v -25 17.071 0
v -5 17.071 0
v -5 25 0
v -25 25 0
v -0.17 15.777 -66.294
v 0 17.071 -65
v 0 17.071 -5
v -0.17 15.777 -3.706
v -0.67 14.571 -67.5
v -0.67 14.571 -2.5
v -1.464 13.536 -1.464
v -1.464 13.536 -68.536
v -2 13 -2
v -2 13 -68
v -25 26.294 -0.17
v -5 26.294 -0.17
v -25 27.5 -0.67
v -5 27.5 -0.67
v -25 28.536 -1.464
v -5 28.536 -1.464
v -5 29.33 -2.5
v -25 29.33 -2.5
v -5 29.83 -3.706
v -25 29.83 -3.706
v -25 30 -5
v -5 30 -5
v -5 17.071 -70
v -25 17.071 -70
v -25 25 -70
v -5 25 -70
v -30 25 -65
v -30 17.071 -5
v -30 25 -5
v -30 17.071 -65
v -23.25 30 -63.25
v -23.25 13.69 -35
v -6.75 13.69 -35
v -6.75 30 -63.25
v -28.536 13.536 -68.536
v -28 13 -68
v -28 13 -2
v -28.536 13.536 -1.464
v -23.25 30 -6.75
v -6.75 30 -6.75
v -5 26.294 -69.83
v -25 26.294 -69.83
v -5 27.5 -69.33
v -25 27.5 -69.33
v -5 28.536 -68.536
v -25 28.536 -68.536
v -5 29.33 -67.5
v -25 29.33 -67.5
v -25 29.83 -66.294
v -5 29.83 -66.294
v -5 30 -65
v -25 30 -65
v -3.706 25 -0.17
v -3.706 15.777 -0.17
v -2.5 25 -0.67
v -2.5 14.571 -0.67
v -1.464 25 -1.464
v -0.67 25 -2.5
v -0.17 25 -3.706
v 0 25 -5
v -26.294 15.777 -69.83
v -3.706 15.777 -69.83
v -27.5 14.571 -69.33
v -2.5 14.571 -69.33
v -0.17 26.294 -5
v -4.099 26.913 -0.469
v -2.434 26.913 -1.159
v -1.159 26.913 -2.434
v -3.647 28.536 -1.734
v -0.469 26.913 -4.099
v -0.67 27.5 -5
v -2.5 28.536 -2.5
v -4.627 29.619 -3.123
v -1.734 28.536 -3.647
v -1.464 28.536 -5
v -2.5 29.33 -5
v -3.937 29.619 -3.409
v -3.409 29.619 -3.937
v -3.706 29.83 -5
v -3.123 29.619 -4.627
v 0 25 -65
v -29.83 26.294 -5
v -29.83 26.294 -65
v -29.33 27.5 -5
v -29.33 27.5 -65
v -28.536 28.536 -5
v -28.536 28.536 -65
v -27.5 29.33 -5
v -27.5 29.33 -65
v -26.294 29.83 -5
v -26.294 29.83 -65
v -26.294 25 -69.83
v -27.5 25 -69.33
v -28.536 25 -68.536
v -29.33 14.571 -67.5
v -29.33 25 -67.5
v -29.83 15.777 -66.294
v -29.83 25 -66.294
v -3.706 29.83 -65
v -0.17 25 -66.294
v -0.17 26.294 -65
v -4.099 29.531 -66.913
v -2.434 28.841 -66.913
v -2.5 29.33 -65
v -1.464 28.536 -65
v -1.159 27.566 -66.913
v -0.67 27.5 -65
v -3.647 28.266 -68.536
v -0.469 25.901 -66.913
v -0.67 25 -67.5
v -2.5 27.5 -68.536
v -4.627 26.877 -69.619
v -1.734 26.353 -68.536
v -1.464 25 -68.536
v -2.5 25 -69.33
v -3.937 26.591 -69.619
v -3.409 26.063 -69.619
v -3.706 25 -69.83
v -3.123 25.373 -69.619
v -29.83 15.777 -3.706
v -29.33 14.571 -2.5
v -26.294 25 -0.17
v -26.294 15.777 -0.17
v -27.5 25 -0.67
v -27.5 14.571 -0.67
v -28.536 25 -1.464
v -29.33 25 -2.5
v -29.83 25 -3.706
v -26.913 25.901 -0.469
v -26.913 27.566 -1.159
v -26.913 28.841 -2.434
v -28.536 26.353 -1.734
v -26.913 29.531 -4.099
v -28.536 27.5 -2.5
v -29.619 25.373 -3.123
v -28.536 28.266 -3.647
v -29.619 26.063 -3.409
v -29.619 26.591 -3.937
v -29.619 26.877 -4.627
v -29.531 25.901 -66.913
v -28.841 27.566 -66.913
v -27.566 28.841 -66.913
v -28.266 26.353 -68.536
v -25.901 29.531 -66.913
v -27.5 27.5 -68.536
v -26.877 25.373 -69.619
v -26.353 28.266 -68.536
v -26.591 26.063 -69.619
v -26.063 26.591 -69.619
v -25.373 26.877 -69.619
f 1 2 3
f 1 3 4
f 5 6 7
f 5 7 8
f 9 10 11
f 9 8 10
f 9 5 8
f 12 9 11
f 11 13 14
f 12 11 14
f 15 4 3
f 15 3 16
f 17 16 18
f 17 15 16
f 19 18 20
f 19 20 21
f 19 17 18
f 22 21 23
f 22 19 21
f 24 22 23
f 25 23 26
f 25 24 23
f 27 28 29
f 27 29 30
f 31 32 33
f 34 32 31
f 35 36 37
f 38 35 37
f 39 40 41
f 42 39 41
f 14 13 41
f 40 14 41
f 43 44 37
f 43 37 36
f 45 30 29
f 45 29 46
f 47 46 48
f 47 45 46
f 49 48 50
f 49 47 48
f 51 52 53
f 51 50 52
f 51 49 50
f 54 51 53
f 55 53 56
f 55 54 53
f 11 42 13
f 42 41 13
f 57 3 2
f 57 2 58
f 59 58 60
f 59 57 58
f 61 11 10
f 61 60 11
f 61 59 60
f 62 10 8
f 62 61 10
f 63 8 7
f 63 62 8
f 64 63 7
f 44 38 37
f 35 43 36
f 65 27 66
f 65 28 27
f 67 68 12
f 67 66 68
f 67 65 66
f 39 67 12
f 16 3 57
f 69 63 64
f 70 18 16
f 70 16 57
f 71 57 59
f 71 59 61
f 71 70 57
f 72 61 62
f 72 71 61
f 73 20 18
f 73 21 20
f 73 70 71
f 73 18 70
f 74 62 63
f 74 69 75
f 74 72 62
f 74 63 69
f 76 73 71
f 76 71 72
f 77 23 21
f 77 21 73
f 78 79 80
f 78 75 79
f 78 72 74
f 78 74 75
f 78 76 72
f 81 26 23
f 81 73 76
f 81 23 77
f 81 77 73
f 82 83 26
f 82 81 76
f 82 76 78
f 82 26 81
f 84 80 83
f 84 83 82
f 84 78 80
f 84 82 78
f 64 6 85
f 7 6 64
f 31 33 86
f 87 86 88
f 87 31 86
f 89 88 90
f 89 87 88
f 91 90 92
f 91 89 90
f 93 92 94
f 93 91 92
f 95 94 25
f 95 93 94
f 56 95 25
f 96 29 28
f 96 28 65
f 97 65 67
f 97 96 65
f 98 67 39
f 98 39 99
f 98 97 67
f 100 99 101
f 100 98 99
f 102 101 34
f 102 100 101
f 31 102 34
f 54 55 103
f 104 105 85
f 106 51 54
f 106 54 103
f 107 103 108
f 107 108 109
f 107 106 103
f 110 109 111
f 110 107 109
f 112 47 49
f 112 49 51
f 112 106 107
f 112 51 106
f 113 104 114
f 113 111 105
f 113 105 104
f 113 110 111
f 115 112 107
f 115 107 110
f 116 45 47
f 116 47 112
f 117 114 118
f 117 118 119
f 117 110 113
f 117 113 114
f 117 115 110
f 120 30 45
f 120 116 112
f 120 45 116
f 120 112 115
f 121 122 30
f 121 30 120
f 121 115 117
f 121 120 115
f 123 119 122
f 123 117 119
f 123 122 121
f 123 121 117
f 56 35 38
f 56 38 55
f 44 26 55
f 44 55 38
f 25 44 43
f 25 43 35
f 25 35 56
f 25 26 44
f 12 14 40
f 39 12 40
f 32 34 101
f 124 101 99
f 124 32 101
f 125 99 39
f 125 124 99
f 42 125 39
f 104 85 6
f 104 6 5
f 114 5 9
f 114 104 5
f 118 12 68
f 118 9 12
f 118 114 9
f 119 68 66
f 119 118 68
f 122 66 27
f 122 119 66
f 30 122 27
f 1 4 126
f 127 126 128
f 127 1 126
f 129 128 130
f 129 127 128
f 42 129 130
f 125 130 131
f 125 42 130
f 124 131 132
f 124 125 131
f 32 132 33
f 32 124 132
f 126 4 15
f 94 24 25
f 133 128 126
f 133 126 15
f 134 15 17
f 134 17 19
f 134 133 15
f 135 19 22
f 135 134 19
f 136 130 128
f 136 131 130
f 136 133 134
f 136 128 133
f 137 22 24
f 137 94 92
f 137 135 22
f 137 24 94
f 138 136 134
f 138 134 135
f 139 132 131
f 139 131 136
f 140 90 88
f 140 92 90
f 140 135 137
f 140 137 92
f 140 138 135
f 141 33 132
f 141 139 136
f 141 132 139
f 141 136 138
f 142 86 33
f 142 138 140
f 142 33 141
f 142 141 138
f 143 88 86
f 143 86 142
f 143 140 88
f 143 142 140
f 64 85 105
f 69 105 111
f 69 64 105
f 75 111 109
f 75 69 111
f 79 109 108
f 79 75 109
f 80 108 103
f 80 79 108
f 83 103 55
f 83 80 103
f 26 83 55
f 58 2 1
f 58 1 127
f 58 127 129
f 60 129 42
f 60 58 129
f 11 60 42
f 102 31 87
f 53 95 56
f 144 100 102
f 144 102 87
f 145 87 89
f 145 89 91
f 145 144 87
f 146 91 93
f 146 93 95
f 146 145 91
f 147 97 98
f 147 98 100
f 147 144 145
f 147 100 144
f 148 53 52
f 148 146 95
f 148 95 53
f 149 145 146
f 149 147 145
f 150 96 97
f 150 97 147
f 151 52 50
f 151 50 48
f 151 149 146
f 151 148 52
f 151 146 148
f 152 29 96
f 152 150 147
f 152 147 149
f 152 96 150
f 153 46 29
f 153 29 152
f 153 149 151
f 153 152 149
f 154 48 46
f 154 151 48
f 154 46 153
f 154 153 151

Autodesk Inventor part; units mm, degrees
ref_plane "YZ Plane" through (0, 0, 0) normal (1, 0, 0) x (0, 1, 0)
ref_plane "XZ Plane" through (0, 0, 0) normal (0, 1, 0) x (-1, 0, 0)
ref_plane "XY Plane" through (0, 0, 0) normal (0, 0, 1) x (1, 0, 0)
sketch "Sketch1" plane through (0, 0, 0) normal (0, 1, 0) x (-1, 0, 0)
  line L0 (0, 0) -> (30, 0)
  line L1 (30, 0) -> (30, -70)
  line L2 (30, -70) -> (0, -70)
  line L3 (0, -70) -> (0, 0)
  dimension "d0" = 70
  dimension "d1" = 30
extrude "Extrusion1" add sketch "Sketch1" along normal blind 30
sketch "Sketch2" plane through (0, 30, 0) normal (0, 1, 0) x (1, 0, 0)
  line L0 (-30, 70) -> (-30, 0) projected
  line L1 (0, 70) -> (-30, 70) projected
  line L2 (-30, 0) -> (0, 0)
  line L3 (0, 0) -> (0, 70)
  line L4 (0, 70) -> (-30, 70)
  line L5 (-30, 70) -> (-30, 0)
  line L6 (-6.75, 6.75) -> (-23.25, 6.75)
  line L7 (-23.25, 6.75) -> (-23.25, 63.25)
  line L8 (-23.25, 63.25) -> (-6.75, 63.25)
  line L9 (-6.75, 63.25) -> (-6.75, 6.75)
  dimension "d4" = 16.5
extrude "Extrusion2" cut sketch "Sketch2" against normal blind 10 contours L6 L7 L8 L9
chamfer "Chamfer1" distance 10 angle 60 1 edges at (-15, 20, -63.25) measured on face at (-12.25, 23.3333, -63.25)
chamfer "Chamfer3" distance 10 angle 60 1 edges at (-15, 20, -6.75) measured on face at (-17.75, 23.3333, -6.75)
move faces "Move1" translate (0, -7.938, 0) faces at (-12.25, 20, -38.6432)
move faces "Move2" translate (0, 13, 0) faces at (-20, 0, -46.6667)
chamfer "Chamfer4" distance 2 angle 45 4 edges at (-15, 13, 0) (0, 13, -35) (-30, 13, -35) (-15, 13, -70)
fillet "Fillet1" radius 5 12 edges at (-30, 22.5, 0) (0, 22.5, 0) (0, 22.5, -70) (-30, 22.5, -70) (-15, 30, 0) (-30, 30, -35) (-15, 30, -70) (0, 30, -35) (-15, 15, 0) (0, 15, -35) (-15, 15, -70) (-30, 15, -35)
properties part number "CalibrationPlate"
